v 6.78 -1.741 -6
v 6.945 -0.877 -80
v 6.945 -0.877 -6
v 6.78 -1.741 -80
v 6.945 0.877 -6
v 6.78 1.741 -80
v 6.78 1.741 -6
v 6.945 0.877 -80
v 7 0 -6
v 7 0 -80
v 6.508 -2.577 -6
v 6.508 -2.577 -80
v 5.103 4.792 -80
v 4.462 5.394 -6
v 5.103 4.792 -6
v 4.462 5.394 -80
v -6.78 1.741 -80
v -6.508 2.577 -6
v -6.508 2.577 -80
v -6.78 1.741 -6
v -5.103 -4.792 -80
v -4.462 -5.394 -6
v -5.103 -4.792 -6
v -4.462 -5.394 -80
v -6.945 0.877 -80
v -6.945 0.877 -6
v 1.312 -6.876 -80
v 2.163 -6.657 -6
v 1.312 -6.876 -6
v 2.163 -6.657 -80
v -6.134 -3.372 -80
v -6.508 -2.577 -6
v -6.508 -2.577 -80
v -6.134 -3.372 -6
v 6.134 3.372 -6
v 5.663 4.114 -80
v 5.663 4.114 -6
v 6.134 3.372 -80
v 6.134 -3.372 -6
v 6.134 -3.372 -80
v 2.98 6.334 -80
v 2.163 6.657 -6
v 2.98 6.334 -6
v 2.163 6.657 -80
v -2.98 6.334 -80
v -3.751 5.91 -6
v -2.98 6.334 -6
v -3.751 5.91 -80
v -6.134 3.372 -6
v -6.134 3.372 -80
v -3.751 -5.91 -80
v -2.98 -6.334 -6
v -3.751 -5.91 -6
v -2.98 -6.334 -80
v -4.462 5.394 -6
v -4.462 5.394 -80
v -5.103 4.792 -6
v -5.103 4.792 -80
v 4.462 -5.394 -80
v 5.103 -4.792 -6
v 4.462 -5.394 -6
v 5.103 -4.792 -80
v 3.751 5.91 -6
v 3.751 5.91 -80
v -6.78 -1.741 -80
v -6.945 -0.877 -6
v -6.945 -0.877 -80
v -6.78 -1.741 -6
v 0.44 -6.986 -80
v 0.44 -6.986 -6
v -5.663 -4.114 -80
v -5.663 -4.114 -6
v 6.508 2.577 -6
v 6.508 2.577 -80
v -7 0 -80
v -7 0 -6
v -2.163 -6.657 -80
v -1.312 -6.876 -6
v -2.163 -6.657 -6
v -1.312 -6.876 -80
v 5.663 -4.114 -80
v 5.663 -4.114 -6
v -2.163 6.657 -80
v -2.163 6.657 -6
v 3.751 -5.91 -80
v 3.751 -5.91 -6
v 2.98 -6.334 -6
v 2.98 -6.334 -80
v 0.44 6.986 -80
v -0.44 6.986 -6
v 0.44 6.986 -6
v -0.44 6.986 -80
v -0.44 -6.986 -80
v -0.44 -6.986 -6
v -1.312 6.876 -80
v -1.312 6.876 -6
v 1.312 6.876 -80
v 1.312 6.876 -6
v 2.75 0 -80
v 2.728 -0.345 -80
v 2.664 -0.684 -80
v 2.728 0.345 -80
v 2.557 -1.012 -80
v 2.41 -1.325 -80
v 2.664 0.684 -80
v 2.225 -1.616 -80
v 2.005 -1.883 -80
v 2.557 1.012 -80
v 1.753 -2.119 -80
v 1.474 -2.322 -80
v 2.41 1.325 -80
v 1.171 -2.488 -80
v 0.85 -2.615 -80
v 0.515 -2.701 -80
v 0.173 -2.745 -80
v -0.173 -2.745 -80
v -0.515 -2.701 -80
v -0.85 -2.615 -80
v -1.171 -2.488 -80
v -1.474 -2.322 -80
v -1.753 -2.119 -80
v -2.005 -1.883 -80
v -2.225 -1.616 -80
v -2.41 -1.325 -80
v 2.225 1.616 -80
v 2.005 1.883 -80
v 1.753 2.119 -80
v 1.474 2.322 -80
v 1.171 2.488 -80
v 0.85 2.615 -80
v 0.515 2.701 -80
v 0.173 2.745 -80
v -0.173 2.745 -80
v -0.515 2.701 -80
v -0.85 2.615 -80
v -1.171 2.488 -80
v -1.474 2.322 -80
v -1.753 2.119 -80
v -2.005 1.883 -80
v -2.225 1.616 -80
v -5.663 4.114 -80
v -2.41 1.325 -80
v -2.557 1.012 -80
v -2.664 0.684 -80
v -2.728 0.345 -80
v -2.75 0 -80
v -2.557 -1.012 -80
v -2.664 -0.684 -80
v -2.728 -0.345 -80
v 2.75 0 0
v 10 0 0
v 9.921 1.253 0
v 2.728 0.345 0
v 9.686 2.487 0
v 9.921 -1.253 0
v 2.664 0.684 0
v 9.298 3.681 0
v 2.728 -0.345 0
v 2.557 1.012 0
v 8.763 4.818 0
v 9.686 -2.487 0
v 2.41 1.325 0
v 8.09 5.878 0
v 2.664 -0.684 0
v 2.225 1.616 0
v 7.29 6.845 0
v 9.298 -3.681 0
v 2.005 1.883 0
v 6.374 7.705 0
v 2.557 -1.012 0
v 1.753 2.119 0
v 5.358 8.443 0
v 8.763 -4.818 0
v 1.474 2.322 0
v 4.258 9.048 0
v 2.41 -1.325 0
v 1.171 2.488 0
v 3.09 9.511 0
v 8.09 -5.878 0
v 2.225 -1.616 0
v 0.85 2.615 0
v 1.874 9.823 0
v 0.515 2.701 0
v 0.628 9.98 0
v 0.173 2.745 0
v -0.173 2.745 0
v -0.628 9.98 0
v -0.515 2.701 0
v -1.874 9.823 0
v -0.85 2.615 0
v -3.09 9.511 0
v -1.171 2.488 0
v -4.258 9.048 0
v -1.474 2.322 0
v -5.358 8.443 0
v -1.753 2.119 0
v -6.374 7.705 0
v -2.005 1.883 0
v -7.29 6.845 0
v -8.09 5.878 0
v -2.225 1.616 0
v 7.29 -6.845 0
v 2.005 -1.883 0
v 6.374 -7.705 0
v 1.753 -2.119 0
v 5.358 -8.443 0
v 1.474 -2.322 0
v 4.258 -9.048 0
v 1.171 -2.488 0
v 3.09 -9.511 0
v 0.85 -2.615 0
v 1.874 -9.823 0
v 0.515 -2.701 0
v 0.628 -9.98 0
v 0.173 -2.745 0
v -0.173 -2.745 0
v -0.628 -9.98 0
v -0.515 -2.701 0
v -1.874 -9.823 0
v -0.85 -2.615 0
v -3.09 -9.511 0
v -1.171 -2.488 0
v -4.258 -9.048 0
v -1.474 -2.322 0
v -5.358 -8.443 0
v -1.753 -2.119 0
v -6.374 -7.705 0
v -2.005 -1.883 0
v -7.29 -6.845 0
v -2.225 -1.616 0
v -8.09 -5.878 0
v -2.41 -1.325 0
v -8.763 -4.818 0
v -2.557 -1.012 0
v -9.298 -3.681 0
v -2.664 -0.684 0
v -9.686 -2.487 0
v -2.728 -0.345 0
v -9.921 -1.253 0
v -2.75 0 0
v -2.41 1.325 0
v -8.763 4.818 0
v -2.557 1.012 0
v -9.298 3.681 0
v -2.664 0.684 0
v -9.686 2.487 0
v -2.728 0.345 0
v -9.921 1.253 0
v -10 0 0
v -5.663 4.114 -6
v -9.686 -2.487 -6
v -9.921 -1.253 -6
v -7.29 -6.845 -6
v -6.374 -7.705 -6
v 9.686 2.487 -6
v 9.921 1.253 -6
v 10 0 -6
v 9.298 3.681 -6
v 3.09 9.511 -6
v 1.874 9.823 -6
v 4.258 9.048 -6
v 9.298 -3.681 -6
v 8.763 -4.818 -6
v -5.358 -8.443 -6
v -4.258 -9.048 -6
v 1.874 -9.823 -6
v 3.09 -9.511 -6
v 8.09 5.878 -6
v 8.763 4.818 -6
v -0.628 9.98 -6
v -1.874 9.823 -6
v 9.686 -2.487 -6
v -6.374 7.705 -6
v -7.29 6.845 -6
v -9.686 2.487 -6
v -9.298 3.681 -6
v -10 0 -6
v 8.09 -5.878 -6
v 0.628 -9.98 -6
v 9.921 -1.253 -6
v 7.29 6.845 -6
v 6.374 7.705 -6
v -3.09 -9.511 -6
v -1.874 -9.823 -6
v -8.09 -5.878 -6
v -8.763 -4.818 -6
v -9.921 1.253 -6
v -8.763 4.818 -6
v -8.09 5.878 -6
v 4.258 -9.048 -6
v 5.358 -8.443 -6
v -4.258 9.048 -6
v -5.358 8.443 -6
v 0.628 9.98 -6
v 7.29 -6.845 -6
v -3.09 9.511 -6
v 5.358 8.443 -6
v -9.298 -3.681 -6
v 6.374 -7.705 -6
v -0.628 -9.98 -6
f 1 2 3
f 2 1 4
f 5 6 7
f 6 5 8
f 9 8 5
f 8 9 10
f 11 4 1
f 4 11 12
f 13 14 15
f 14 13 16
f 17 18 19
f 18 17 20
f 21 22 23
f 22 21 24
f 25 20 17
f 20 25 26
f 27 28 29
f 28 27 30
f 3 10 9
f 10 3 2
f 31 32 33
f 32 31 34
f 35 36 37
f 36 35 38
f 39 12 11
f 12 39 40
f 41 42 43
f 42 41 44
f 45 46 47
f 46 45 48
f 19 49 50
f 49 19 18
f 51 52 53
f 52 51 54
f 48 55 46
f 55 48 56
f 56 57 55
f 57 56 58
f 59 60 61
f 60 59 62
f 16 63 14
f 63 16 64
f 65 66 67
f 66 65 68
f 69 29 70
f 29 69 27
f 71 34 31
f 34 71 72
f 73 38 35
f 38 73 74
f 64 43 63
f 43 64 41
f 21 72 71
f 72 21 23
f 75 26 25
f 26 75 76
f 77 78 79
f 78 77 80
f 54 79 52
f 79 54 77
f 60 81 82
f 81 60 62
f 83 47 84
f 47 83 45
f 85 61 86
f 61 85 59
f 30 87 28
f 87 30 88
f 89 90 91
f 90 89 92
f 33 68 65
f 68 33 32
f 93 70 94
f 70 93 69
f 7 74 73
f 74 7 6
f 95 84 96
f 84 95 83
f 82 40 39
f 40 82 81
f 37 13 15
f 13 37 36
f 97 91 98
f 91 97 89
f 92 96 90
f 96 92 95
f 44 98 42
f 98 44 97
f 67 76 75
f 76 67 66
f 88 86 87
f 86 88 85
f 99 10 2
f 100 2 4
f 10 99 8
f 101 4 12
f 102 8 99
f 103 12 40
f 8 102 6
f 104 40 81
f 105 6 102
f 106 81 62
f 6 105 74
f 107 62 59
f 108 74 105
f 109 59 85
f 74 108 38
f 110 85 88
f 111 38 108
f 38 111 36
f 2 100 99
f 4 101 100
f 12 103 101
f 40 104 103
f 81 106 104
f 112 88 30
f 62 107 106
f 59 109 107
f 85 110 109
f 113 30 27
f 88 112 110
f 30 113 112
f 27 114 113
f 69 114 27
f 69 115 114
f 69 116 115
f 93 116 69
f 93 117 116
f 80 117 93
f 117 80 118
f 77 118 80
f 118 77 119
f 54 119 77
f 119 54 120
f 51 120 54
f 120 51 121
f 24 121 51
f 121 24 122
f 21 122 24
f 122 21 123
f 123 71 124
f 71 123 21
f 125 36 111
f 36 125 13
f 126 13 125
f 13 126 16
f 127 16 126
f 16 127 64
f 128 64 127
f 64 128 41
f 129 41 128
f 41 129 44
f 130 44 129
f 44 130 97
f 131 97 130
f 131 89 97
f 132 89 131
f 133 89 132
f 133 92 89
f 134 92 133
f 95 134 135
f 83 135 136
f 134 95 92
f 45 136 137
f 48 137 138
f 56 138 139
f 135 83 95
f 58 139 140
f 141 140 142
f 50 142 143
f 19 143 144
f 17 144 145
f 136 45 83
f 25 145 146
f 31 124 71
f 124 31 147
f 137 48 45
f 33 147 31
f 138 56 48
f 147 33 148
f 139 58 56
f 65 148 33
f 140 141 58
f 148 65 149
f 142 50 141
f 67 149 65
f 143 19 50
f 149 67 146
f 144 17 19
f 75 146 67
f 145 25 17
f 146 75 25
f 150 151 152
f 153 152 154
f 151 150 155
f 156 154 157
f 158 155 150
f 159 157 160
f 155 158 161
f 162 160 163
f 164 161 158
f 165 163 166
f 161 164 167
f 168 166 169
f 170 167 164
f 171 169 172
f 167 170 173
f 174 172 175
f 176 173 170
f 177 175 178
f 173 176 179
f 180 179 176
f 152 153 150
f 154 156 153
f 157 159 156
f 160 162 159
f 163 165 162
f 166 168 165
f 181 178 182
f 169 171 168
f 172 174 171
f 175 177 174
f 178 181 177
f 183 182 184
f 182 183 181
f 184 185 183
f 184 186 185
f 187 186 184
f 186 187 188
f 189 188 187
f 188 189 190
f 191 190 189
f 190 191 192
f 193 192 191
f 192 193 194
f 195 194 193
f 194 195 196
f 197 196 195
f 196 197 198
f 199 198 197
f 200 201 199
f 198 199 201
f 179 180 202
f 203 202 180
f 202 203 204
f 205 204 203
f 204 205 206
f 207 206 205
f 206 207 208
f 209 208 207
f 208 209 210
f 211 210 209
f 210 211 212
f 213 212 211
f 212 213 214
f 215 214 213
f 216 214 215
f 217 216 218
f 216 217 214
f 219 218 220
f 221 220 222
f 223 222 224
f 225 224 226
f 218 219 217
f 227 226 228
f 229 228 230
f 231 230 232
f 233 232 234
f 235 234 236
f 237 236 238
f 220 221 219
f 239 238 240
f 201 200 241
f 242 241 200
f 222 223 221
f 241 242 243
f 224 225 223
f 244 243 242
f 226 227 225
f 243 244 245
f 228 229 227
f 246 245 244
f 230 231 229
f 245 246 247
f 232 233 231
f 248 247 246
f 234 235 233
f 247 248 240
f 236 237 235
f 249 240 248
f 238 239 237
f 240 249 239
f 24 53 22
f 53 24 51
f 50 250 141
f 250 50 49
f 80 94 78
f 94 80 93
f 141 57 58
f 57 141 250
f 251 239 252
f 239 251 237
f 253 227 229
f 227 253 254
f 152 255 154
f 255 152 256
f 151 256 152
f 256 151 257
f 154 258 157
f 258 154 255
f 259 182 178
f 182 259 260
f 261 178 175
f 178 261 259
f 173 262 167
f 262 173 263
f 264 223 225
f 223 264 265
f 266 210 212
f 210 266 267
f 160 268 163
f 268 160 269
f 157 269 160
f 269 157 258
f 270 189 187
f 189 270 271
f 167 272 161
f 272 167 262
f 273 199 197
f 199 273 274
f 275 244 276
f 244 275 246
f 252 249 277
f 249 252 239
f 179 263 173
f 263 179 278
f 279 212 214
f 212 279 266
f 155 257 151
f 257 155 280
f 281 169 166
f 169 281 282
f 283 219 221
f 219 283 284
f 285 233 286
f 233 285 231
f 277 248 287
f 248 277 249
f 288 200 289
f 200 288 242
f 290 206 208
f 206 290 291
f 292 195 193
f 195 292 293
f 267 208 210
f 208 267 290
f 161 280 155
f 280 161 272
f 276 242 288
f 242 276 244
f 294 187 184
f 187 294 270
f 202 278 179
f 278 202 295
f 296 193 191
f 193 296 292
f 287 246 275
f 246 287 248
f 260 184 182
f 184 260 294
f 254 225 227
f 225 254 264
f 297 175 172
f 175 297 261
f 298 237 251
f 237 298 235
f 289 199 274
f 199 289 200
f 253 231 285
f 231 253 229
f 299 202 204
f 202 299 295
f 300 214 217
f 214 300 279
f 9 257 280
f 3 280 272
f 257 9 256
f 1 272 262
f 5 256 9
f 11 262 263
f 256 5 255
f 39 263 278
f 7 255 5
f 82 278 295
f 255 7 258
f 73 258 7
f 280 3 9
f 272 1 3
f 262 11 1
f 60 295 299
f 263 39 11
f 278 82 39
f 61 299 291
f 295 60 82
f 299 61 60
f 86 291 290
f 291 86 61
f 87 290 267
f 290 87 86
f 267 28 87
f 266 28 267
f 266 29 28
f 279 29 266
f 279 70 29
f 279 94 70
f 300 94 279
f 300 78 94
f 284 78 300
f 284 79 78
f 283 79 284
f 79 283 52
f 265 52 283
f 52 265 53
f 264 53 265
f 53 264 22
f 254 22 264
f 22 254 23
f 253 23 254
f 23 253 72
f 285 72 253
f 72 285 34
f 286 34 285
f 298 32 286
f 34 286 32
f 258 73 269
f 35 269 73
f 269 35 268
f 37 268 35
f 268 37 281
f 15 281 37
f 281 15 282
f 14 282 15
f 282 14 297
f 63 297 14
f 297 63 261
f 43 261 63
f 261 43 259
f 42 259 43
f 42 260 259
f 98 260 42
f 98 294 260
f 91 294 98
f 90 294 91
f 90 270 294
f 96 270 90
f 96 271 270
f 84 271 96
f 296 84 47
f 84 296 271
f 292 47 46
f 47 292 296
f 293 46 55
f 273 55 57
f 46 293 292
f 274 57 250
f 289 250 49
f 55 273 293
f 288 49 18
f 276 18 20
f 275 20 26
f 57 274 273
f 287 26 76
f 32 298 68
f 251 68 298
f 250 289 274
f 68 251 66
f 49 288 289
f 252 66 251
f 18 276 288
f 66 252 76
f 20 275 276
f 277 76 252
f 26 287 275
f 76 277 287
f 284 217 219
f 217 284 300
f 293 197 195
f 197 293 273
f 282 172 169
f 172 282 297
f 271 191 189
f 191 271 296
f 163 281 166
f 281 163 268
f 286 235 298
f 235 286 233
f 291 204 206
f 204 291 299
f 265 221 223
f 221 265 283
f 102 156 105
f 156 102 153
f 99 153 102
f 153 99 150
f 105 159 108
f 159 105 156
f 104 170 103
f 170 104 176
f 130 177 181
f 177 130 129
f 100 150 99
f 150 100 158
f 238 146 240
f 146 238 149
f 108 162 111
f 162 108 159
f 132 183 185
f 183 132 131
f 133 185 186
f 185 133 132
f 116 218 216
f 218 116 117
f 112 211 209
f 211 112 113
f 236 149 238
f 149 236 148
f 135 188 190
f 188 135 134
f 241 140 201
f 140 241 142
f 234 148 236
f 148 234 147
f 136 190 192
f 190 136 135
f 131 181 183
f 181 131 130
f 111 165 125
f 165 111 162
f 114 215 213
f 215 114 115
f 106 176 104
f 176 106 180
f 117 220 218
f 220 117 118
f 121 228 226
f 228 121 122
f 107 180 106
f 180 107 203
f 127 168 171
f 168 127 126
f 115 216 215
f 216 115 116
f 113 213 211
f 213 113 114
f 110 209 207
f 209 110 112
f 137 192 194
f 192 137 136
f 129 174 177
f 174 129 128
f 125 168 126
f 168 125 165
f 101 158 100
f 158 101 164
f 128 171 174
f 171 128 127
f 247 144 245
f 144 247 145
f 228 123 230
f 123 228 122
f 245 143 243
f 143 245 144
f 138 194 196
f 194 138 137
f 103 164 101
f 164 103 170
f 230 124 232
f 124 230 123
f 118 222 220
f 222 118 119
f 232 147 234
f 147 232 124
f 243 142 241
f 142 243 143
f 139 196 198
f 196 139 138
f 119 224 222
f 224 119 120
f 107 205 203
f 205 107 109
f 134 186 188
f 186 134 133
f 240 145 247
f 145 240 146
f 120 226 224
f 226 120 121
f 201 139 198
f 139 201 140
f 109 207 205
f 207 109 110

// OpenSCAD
$fn = 50;


difference() {
	union() {
		translate(v = [0, 0, -80.0000000000]) {
			cylinder(h = 80, r = 7.0000000000);
		}
		translate(v = [0, 0, -6.0000000000]) {
			cylinder(h = 6, r = 10.0000000000);
		}
	}
	union() {
		#translate(v = [0, 0, -80]) {
			cylinder(h = 80, r = 2.7500000000);
		}
	}
}
